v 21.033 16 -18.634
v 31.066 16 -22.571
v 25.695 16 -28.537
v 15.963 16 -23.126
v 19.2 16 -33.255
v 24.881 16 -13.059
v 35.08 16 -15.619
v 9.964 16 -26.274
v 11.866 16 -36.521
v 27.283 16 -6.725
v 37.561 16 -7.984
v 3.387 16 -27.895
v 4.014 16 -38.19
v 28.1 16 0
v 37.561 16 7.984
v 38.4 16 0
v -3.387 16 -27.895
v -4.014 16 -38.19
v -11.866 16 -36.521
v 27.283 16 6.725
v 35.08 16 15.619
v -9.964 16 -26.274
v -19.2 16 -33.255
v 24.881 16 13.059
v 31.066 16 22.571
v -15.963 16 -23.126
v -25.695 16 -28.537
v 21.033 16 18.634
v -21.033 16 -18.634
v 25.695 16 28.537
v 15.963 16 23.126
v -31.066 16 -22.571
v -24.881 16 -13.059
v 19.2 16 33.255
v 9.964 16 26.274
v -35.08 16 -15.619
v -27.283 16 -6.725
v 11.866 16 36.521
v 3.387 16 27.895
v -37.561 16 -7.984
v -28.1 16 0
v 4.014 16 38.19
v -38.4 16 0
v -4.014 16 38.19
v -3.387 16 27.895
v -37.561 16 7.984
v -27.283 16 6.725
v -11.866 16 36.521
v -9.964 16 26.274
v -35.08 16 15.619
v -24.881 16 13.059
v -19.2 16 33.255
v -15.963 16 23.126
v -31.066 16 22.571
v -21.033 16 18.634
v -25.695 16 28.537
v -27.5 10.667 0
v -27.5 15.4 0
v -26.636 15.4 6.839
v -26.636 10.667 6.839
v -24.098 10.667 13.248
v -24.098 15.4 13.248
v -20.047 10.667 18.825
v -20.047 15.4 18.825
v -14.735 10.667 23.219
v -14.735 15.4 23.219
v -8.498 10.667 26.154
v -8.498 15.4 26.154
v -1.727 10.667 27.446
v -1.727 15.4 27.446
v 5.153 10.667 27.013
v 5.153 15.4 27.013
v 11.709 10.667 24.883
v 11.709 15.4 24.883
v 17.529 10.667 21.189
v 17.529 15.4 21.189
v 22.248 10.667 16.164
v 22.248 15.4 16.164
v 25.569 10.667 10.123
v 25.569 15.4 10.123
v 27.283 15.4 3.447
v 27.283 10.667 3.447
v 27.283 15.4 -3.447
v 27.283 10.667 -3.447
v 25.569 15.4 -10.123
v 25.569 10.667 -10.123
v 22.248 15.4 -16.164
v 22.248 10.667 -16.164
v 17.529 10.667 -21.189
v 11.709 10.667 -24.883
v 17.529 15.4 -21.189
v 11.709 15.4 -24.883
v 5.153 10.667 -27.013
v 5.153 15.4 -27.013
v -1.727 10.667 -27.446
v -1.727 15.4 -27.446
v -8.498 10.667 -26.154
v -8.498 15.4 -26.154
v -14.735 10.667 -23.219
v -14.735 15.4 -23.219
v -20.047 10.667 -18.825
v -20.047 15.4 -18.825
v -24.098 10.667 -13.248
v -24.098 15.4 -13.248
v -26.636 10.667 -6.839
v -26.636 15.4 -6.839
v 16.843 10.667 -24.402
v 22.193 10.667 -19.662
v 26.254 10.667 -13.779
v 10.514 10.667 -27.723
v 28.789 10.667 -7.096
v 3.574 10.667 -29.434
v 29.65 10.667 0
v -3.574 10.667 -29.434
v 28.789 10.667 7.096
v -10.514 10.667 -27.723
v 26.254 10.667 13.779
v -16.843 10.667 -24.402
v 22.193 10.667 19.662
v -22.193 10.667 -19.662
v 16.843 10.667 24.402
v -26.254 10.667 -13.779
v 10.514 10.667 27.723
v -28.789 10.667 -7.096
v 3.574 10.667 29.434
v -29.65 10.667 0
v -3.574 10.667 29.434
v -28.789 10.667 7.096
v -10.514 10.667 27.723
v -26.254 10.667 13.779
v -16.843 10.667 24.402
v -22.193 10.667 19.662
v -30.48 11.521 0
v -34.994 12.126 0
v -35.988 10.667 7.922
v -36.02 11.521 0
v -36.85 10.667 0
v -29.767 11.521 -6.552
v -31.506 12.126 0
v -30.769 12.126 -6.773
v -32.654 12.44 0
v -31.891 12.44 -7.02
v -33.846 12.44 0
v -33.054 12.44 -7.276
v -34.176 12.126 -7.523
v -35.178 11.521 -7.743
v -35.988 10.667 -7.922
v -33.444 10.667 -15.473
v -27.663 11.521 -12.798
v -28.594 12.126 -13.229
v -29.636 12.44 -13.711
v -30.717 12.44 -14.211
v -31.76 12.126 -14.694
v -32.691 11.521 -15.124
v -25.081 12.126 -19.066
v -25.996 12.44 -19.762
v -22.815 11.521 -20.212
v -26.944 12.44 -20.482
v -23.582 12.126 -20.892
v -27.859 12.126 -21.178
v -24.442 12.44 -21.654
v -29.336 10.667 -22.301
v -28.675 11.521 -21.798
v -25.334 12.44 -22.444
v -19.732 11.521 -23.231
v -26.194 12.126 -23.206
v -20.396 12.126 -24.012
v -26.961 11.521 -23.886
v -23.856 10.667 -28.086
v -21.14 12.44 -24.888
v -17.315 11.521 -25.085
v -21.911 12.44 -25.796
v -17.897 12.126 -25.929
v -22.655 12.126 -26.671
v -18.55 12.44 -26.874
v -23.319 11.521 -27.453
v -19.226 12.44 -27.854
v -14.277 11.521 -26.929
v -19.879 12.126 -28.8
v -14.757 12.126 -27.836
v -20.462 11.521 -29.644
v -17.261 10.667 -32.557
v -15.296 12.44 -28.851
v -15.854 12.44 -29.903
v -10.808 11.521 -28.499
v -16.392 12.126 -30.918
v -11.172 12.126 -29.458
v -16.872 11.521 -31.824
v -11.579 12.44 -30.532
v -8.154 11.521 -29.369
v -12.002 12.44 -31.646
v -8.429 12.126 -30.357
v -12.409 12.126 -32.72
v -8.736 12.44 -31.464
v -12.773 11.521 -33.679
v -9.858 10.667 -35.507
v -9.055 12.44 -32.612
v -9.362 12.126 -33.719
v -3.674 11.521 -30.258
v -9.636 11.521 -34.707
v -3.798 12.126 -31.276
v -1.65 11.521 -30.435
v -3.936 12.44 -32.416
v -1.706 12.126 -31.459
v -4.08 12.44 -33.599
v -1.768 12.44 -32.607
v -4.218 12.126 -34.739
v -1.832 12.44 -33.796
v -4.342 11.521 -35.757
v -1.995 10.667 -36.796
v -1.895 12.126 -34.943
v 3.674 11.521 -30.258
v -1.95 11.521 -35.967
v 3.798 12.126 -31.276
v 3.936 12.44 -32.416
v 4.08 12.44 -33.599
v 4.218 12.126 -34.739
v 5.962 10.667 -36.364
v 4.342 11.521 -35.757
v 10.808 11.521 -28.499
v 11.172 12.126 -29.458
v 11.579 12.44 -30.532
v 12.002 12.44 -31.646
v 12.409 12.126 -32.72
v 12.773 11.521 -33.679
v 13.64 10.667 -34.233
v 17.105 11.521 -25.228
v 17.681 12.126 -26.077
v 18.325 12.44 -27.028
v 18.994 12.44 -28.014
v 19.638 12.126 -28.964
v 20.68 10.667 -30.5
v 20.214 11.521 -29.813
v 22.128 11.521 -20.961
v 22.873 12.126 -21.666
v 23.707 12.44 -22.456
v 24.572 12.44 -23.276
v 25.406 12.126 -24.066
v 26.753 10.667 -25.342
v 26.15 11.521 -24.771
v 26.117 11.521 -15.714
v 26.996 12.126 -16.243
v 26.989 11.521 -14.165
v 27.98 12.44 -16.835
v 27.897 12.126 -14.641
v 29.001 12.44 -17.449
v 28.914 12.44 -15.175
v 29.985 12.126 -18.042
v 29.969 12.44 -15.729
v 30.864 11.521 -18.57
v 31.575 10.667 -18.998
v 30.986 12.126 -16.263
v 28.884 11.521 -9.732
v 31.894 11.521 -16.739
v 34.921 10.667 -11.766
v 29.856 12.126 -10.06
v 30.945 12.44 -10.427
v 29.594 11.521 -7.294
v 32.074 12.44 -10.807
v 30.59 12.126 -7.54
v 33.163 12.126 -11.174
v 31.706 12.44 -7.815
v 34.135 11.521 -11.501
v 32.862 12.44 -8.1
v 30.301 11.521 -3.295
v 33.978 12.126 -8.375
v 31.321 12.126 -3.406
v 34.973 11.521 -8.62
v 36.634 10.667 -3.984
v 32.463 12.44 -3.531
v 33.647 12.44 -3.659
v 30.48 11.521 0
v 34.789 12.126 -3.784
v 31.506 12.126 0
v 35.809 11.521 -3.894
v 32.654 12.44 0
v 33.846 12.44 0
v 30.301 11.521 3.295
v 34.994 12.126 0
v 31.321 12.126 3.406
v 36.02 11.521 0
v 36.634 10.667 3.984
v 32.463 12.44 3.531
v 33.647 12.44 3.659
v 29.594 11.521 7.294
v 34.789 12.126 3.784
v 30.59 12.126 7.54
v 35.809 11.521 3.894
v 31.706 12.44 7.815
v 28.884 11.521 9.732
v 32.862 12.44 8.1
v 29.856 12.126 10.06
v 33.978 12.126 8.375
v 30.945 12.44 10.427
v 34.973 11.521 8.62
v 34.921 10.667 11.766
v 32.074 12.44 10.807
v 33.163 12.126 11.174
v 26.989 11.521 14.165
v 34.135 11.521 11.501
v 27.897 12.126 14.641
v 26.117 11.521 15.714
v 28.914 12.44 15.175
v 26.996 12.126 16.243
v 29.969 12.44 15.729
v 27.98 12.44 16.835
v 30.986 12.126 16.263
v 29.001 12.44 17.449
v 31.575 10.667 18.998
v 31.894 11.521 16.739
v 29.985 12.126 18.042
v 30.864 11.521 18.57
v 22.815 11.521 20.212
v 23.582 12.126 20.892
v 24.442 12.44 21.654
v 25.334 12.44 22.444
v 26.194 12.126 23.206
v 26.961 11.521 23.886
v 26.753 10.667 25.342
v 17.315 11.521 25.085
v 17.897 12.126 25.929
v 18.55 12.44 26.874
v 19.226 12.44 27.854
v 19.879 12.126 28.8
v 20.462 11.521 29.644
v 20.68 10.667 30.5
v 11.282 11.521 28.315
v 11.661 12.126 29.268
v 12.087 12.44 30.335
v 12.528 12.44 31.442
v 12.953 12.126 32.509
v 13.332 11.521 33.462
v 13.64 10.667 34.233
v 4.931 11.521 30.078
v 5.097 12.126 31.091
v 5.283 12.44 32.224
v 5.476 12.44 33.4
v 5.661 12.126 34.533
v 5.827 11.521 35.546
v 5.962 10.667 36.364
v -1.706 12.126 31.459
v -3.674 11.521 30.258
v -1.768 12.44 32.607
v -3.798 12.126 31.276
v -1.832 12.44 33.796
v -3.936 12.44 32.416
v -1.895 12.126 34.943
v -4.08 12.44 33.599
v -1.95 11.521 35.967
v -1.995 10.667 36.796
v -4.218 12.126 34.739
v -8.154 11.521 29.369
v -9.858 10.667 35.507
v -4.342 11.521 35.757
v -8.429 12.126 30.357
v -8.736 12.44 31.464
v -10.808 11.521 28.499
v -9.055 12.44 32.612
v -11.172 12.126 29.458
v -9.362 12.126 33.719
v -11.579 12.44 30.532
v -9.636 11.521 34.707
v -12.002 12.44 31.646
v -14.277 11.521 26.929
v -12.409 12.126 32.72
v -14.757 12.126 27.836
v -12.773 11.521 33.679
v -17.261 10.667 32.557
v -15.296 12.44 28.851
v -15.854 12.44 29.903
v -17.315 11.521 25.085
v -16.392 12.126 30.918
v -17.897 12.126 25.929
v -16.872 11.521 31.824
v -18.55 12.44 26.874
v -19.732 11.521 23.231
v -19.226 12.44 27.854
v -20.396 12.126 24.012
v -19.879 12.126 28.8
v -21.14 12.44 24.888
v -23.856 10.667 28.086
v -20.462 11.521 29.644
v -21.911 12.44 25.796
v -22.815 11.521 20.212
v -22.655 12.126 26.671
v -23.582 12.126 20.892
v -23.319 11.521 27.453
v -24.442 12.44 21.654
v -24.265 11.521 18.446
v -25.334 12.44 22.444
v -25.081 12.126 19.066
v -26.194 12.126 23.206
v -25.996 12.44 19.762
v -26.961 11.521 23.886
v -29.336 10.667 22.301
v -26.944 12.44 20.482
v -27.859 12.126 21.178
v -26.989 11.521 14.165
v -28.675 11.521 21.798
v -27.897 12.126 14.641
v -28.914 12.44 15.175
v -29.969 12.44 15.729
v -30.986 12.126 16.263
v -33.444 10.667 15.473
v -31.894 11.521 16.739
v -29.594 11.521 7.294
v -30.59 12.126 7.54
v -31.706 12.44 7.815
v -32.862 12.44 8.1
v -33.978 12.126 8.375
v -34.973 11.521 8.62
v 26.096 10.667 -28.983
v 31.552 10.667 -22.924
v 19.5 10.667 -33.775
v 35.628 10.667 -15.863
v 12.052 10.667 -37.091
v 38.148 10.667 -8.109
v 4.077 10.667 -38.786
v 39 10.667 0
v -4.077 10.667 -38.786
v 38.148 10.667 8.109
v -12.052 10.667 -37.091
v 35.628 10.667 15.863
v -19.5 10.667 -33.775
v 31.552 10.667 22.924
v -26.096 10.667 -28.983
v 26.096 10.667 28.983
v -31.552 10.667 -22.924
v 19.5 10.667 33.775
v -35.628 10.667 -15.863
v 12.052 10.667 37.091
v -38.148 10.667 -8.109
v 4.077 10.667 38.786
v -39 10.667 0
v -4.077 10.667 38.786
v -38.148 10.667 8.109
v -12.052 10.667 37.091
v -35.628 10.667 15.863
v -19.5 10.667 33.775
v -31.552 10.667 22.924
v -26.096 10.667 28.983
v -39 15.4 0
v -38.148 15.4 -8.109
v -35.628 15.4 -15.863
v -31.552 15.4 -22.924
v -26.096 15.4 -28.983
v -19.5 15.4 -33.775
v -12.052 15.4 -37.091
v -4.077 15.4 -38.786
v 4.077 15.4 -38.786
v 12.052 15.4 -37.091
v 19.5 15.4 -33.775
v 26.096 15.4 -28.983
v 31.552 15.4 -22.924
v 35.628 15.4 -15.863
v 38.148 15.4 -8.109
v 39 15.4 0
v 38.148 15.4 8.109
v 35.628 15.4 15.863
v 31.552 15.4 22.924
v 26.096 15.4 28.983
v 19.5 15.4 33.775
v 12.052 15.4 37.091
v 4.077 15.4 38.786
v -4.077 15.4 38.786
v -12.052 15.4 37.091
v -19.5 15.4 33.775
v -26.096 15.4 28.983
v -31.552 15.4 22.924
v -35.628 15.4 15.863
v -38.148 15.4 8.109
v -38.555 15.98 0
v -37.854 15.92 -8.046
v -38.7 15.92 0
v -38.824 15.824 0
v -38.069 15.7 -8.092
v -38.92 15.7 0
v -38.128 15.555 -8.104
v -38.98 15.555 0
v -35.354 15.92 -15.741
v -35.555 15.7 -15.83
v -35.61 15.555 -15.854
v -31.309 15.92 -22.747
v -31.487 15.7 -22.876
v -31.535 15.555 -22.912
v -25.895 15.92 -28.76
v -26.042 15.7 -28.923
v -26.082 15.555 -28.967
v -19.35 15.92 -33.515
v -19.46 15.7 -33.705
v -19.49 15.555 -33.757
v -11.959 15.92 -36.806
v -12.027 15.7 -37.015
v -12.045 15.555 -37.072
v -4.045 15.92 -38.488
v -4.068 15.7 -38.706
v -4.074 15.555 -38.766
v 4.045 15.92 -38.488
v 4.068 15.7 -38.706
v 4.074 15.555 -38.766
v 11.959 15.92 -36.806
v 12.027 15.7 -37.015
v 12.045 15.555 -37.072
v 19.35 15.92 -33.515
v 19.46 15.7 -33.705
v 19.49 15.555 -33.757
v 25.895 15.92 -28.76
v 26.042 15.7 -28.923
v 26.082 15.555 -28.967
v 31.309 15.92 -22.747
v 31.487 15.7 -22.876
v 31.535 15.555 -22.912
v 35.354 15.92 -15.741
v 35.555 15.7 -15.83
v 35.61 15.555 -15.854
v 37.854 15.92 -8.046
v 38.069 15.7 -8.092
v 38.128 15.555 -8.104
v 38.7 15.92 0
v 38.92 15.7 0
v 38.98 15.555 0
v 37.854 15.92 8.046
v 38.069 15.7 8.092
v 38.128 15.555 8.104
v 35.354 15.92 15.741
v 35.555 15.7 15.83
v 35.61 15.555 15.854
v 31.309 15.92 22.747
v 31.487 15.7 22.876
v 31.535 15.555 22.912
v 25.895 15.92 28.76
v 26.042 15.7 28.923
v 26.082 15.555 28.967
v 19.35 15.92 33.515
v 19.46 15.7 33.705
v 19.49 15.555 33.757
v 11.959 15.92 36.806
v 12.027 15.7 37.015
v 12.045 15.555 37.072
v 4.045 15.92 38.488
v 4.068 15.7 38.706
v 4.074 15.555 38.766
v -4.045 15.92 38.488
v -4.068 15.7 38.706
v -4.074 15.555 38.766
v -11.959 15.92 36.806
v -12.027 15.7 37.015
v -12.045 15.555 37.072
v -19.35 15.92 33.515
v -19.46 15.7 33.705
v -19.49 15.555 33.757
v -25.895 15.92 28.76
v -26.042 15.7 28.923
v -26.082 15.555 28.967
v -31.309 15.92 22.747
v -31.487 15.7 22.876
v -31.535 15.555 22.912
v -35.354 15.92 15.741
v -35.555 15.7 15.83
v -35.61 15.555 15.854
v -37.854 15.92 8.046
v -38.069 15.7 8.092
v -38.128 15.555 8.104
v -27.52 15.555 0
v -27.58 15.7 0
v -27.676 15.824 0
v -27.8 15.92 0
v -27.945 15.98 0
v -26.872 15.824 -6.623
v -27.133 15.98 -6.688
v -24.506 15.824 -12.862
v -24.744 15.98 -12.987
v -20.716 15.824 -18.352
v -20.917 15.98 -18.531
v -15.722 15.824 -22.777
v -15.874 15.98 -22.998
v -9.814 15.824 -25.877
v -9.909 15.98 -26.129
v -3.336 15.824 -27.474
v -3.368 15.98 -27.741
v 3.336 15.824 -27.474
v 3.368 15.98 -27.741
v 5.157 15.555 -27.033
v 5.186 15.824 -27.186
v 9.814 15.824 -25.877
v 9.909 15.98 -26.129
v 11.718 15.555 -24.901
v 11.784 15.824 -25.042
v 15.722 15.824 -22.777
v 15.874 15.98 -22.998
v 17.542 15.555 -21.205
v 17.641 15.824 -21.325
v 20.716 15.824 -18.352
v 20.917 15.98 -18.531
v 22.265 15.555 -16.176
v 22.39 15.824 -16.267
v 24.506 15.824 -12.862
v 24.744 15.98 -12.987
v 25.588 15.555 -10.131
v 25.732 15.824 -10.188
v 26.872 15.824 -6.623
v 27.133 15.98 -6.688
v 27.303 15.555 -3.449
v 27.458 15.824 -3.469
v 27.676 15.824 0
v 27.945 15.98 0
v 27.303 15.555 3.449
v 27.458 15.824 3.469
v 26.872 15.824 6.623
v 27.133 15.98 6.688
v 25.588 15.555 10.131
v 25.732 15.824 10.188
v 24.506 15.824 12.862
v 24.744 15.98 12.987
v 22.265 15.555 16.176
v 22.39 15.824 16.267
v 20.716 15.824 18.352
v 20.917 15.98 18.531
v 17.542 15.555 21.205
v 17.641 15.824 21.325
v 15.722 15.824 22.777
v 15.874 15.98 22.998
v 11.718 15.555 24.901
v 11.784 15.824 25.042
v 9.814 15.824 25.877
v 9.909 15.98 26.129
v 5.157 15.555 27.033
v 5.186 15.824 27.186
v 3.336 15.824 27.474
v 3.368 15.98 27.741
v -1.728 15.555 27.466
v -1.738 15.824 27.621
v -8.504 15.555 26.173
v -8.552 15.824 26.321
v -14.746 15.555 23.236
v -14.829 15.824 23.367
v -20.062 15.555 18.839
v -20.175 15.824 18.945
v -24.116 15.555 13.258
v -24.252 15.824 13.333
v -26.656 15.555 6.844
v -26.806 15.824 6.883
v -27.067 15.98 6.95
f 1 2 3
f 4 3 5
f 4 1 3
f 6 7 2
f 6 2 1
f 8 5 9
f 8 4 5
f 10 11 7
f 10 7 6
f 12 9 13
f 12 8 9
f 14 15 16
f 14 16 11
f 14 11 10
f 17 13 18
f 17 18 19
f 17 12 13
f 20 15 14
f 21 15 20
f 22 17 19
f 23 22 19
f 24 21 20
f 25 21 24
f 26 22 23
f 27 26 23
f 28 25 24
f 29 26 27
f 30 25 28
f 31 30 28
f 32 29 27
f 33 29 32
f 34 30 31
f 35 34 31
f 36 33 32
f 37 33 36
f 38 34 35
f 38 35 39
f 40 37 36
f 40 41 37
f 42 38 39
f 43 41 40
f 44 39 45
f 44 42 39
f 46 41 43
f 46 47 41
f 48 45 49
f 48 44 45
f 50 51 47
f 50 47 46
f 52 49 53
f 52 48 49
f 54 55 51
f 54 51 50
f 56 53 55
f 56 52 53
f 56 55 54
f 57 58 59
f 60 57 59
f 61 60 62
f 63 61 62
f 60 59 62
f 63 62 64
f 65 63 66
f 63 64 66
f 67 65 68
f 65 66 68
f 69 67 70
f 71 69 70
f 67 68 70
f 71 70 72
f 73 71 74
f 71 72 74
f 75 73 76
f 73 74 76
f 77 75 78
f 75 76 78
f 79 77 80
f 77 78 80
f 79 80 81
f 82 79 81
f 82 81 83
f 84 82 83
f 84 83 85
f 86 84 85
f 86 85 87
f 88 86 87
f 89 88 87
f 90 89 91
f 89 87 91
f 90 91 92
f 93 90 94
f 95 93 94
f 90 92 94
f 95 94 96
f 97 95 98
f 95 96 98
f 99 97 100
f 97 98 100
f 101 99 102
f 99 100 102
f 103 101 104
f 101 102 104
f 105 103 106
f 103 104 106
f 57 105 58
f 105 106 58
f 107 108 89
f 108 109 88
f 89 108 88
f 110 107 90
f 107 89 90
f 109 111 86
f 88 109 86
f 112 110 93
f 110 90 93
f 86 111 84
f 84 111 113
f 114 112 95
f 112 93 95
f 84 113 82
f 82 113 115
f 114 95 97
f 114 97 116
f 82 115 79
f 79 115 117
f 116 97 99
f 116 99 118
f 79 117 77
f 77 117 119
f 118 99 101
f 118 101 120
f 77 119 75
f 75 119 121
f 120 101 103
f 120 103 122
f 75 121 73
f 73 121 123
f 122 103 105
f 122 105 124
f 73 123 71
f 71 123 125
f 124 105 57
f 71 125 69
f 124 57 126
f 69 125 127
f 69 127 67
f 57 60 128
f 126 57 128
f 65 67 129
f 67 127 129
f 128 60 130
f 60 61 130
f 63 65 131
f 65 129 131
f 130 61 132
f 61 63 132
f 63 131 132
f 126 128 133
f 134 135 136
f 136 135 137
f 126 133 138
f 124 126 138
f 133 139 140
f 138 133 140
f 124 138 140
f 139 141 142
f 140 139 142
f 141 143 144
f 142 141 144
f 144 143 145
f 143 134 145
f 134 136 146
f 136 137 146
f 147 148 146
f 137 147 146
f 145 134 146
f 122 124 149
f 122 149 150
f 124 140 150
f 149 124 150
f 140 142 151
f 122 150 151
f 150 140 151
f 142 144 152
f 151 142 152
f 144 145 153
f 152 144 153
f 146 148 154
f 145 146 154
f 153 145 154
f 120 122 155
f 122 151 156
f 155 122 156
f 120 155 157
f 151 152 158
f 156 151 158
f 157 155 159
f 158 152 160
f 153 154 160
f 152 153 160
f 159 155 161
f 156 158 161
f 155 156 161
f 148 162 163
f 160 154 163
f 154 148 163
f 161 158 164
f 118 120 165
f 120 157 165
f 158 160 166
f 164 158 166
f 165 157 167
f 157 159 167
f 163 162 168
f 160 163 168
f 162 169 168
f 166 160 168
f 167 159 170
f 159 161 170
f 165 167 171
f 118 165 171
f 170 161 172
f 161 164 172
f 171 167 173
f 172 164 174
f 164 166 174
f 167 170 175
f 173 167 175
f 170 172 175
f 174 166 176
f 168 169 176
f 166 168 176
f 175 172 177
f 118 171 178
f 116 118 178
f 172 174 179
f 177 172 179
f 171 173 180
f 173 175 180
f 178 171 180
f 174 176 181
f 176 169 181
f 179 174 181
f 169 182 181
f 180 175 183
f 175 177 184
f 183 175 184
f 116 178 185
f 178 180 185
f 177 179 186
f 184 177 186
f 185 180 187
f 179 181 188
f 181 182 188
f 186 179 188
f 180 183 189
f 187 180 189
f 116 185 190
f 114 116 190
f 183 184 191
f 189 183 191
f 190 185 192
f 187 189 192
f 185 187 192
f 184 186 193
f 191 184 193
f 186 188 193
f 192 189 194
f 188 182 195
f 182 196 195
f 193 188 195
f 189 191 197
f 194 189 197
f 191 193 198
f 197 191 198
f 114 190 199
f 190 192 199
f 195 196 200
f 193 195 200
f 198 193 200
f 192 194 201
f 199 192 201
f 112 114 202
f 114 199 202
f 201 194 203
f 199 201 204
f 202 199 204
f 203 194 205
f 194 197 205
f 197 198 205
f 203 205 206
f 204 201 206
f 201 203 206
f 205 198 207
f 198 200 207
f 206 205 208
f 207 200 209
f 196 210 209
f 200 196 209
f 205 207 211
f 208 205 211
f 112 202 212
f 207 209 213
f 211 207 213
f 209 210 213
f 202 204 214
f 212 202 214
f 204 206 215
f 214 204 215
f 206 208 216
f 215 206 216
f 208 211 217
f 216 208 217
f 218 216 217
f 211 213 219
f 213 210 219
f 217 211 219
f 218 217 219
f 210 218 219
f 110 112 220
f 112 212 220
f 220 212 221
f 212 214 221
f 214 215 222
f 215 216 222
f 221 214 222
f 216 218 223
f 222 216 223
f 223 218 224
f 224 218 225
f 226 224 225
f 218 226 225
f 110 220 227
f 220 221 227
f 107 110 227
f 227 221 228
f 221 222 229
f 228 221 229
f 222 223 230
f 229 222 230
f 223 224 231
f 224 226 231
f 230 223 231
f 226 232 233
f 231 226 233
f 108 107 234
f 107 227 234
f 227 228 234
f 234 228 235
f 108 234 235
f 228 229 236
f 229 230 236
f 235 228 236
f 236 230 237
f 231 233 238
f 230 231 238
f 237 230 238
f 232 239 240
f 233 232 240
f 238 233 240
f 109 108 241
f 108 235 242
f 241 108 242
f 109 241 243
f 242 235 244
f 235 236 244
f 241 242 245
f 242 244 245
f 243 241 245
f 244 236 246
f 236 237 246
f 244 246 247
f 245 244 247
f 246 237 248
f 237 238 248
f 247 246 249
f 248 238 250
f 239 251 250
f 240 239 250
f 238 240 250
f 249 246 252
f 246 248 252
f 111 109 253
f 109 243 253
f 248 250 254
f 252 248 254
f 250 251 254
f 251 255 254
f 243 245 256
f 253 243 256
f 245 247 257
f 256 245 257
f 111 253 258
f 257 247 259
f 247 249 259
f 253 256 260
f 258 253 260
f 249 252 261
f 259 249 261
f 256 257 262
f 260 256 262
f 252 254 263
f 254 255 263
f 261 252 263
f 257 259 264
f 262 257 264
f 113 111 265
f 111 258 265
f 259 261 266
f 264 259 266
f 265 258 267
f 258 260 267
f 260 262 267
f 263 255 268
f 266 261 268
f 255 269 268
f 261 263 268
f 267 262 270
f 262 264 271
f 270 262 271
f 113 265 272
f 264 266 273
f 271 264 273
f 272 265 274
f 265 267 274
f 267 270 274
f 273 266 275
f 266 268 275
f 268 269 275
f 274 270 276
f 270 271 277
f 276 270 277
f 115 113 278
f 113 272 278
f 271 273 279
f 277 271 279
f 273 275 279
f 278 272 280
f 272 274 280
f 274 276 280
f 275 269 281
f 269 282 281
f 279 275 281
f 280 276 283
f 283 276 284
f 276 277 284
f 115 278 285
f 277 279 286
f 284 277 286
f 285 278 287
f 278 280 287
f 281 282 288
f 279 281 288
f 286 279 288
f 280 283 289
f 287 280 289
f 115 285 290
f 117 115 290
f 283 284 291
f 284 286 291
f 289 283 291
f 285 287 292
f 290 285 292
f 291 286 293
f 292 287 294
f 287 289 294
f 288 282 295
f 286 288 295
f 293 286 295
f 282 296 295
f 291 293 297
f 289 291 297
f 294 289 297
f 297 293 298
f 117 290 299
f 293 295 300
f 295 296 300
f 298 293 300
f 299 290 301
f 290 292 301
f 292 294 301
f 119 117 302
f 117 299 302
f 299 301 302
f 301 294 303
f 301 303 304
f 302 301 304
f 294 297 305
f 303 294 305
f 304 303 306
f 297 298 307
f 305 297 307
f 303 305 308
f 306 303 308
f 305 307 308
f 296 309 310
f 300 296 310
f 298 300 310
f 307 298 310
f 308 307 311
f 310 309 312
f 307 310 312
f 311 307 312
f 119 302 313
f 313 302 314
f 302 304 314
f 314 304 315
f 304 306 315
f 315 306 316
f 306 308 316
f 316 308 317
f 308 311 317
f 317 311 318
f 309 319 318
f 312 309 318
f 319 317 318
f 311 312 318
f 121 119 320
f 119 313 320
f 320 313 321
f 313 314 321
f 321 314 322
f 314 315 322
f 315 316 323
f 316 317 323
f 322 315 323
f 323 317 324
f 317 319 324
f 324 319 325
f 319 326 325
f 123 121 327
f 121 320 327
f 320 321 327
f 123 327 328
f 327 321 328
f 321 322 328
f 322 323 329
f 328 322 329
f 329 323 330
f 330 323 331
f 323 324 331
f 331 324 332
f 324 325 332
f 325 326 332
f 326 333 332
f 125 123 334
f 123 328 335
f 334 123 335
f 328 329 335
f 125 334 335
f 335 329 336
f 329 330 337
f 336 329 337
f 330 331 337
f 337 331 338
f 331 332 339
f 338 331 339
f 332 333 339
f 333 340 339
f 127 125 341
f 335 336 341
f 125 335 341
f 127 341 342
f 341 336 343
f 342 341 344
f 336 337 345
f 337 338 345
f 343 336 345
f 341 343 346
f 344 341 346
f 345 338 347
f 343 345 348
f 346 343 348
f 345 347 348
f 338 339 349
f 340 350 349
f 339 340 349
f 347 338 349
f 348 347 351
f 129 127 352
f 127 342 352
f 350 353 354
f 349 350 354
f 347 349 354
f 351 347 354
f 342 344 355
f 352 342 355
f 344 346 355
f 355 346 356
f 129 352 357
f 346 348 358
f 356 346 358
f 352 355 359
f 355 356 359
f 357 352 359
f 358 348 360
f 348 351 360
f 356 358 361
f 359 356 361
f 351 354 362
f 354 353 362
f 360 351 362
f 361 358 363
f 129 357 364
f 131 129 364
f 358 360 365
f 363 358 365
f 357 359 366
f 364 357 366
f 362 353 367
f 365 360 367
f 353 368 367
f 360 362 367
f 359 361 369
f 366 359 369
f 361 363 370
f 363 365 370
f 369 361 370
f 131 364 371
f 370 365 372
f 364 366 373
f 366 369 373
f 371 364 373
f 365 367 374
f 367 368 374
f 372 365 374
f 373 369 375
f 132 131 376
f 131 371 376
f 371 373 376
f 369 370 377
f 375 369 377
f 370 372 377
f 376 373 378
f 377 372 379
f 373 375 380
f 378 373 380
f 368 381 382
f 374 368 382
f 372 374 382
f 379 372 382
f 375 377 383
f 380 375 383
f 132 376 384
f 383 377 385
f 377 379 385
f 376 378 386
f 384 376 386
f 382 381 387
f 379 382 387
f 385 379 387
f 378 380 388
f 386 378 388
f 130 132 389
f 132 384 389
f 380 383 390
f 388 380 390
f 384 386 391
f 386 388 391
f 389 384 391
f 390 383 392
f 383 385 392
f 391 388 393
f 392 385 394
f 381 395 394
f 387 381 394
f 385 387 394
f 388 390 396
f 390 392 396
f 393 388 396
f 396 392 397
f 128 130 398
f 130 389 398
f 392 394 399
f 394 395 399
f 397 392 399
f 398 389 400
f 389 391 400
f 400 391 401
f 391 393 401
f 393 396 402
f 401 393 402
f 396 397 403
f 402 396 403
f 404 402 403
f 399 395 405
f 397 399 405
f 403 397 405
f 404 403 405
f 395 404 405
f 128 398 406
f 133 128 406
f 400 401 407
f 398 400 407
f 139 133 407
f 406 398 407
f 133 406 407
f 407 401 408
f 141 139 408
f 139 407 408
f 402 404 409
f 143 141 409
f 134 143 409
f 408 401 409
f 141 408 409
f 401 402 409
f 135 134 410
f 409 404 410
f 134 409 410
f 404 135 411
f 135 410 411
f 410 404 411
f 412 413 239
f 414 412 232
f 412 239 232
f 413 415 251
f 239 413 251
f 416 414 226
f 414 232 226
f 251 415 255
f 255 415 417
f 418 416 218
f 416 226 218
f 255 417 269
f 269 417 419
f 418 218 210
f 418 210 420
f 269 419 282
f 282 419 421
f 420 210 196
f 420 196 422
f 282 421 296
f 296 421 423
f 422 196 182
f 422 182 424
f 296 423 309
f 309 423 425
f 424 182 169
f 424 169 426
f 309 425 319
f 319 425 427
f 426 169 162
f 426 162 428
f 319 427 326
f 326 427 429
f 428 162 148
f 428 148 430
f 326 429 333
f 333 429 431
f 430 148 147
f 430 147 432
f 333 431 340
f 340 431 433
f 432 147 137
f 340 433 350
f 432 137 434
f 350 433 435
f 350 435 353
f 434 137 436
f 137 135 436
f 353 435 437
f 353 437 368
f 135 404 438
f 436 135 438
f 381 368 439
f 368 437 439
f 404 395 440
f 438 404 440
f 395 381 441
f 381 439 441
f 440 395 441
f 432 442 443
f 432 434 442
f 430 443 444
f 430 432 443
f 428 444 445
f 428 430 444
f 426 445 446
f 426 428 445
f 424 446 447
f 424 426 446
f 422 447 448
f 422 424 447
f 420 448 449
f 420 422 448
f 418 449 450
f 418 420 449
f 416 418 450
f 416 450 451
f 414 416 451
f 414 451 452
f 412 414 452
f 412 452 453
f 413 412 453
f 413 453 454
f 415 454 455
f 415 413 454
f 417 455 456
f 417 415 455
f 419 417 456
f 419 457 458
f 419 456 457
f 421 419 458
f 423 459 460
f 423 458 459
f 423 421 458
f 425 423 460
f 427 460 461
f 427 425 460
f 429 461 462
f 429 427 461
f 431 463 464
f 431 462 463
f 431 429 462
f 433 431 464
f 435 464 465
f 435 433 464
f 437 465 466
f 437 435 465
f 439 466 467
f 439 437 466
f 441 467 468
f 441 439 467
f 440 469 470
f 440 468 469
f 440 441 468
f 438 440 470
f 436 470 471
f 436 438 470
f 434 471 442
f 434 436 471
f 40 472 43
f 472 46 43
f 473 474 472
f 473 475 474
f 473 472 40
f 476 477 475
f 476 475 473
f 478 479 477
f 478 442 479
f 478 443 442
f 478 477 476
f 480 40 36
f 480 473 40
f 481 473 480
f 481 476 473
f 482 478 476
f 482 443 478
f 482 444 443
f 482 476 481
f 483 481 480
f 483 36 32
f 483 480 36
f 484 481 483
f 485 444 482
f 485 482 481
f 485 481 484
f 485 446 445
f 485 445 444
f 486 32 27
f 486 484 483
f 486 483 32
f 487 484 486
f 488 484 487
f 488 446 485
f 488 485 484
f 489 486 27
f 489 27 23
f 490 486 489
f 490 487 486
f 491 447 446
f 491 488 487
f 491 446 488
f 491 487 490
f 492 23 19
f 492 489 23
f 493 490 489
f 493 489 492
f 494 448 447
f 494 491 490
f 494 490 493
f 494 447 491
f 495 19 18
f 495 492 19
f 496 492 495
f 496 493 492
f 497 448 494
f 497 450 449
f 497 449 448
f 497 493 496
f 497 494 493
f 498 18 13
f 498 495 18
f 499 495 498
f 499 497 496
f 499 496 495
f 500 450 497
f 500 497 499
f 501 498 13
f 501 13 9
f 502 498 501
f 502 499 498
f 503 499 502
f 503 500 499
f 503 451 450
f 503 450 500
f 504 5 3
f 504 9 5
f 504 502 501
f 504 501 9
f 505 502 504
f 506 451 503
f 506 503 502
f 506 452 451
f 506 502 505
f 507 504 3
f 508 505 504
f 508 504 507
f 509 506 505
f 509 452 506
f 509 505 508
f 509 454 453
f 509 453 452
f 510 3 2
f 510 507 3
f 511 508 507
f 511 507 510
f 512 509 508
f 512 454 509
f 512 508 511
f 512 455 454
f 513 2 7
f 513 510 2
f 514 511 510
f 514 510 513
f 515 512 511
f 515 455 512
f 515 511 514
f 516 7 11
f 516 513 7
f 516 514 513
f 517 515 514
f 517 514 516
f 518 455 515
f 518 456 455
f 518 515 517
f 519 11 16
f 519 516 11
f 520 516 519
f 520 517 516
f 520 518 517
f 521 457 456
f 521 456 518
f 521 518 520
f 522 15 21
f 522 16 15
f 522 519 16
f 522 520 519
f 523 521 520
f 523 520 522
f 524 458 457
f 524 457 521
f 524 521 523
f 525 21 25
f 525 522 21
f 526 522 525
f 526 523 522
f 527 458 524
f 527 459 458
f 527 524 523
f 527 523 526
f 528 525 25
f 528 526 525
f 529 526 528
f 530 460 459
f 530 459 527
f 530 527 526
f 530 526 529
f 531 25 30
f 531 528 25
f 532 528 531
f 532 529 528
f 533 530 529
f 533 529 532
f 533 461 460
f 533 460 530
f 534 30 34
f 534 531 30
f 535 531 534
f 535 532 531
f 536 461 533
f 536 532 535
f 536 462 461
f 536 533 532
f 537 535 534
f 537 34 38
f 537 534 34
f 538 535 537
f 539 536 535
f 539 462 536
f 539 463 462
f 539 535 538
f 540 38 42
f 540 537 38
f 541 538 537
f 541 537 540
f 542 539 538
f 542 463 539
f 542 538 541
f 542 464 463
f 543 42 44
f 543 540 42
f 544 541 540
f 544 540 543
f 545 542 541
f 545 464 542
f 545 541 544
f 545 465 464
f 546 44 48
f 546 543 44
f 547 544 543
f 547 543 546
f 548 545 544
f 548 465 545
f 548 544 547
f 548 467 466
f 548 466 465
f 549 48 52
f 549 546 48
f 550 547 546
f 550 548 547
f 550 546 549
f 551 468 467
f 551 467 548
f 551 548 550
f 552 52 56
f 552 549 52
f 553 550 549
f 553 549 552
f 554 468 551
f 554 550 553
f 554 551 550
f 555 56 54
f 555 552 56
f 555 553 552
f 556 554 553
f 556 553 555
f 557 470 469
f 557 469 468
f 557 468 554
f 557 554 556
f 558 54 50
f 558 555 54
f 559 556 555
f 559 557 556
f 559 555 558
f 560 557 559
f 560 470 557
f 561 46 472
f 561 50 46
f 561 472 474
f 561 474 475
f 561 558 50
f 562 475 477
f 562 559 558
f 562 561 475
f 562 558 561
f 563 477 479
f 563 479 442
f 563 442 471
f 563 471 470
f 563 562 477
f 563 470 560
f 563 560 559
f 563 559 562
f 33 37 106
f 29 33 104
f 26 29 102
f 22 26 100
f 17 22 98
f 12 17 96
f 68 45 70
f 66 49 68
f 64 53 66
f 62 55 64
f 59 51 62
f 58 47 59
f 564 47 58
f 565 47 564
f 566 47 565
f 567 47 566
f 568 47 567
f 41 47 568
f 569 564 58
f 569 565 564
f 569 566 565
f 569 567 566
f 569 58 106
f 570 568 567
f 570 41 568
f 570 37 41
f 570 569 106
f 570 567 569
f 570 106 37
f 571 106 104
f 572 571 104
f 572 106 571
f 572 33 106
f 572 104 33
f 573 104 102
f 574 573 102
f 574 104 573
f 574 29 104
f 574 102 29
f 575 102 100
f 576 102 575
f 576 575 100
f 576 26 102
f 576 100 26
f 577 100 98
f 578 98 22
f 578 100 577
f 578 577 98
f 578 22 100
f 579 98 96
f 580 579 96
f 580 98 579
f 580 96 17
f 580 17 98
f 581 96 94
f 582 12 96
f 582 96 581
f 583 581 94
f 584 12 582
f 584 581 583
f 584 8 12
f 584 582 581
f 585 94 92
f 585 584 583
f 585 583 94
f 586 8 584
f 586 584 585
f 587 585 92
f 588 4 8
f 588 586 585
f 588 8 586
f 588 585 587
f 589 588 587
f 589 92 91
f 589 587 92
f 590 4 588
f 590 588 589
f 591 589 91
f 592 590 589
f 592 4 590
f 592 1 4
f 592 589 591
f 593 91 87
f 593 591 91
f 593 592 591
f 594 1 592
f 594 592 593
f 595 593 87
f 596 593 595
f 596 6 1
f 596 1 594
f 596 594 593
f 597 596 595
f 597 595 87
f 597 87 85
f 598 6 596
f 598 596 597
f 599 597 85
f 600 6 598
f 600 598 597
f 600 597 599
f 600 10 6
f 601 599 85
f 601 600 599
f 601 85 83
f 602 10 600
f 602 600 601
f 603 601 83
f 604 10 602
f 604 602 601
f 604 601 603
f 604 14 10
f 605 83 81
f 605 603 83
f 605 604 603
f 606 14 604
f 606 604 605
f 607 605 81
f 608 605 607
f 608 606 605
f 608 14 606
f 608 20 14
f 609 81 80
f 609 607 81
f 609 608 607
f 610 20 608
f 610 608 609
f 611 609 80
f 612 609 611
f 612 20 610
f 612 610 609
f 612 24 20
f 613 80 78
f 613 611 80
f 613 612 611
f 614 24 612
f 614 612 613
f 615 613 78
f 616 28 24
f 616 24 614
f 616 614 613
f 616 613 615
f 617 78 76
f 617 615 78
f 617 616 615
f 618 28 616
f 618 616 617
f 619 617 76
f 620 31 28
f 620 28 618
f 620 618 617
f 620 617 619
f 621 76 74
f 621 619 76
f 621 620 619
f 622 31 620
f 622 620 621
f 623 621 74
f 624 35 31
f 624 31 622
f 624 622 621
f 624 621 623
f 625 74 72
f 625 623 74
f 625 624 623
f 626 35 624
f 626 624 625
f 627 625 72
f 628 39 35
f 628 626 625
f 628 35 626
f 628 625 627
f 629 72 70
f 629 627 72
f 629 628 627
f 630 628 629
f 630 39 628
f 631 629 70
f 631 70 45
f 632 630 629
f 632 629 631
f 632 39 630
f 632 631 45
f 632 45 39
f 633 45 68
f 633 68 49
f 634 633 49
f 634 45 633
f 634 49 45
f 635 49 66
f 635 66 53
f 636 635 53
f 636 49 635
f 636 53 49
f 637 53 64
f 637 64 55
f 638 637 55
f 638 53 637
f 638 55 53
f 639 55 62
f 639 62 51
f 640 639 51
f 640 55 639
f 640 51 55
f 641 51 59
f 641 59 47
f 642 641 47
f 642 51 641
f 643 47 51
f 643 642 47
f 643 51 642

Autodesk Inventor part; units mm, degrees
sketch "Sketch_1" plane through (0, 0, 0) normal (0, 0, 1) x (1, 0, 0)
  line L0 (0, 16) -> (0, 10.6667)
  line L1 (-39, 10.6667) -> (-36.8499, 10.6667)
  arc A0 (-29.6501, 10.6667) -> (-36.8499, 10.6667) centre (-33.25, 8) ccw
  line L2 (-29.6501, 10.6667) -> (-27.5, 10.6667)
  line L3 (-27.5, 10.6667) -> (-27.5, 15.4)
  arc A1 (-27.5, 15.4) -> (-28.1, 16) centre (-28.1, 15.4) ccw
  line L4 (-28.1, 16) -> (-38.4, 16)
  arc A2 (-38.4, 16) -> (-39, 15.4) centre (-38.4, 15.4) ccw
  line L5 (-39, 15.4) -> (-39, 10.6667)
revolve "Revolution1" add sketch "Sketch_1" angle 360 about axis through (0, 16, 0) along (0, 1, 0)
ref_plane "tb_sdt_srd_XY" through (0, 0, 0) normal (0, 1, 0) x (1, 0, 0)
ref_plane "tb_sdt_srd_YZ" through (0, 0, 0) normal (1, 0, 0) x (0, 0, -1)
ref_plane "tb_sdt_srd_ZX" through (0, 0, 0) normal (0, 0, -1) x (0, 1, 0)
ref_plane "tb_sdt_srd1_1_XY" through (0, 8, -33.25) normal (0, 1, 0) x (1, 0, 0)
ref_plane "tb_sdt_srd1_1_YZ" through (0, 8, -33.25) normal (1, 0, 0) x (0, 0, -1)
ref_plane "tb_sdt_srd1_1_ZX" through (0, 8, -33.25) normal (0, 0, -1) x (0, 1, 0)
ref_plane "tb_sdt_srd1_10_XY" through (25.9959, 8, 20.731) normal (0, 1, 0) x (1, 0, 0)
ref_plane "tb_sdt_srd1_10_YZ" through (25.9959, 8, 20.731) normal (1, 0, 0) x (0, 0, -1)
ref_plane "tb_sdt_srd1_10_ZX" through (25.9959, 8, 20.731) normal (0, 0, -1) x (0, 1, 0)
ref_plane "tb_sdt_srd1_11_XY" through (32.4164, 8, 7.3988) normal (0, 1, 0) x (1, 0, 0)
ref_plane "tb_sdt_srd1_11_YZ" through (32.4164, 8, 7.3988) normal (1, 0, 0) x (0, 0, -1)
ref_plane "tb_sdt_srd1_11_ZX" through (32.4164, 8, 7.3988) normal (0, 0, -1) x (0, 1, 0)
ref_plane "tb_sdt_srd1_12_XY" through (32.4164, 8, -7.3988) normal (0, 1, 0) x (1, 0, 0)
ref_plane "tb_sdt_srd1_12_YZ" through (32.4164, 8, -7.3988) normal (1, 0, 0) x (0, 0, -1)
ref_plane "tb_sdt_srd1_12_ZX" through (32.4164, 8, -7.3988) normal (0, 0, -1) x (0, 1, 0)
ref_plane "tb_sdt_srd1_13_XY" through (25.9959, 8, -20.731) normal (0, 1, 0) x (1, 0, 0)
ref_plane "tb_sdt_srd1_13_YZ" through (25.9959, 8, -20.731) normal (1, 0, 0) x (0, 0, -1)
ref_plane "tb_sdt_srd1_13_ZX" through (25.9959, 8, -20.731) normal (0, 0, -1) x (0, 1, 0)
ref_plane "tb_sdt_srd1_14_XY" through (14.4266, 8, -29.9572) normal (0, 1, 0) x (1, 0, 0)
ref_plane "tb_sdt_srd1_14_YZ" through (14.4266, 8, -29.9572) normal (1, 0, 0) x (0, 0, -1)
ref_plane "tb_sdt_srd1_14_ZX" through (14.4266, 8, -29.9572) normal (0, 0, -1) x (0, 1, 0)
ref_plane "tb_sdt_srd1_2_XY" through (-14.4266, 8, -29.9572) normal (0, 1, 0) x (1, 0, 0)
ref_plane "tb_sdt_srd1_2_YZ" through (-14.4266, 8, -29.9572) normal (1, 0, 0) x (0, 0, -1)
ref_plane "tb_sdt_srd1_2_ZX" through (-14.4266, 8, -29.9572) normal (0, 0, -1) x (0, 1, 0)
ref_plane "tb_sdt_srd1_3_XY" through (-25.9959, 8, -20.731) normal (0, 1, 0) x (1, 0, 0)
ref_plane "tb_sdt_srd1_3_YZ" through (-25.9959, 8, -20.731) normal (1, 0, 0) x (0, 0, -1)
ref_plane "tb_sdt_srd1_3_ZX" through (-25.9959, 8, -20.731) normal (0, 0, -1) x (0, 1, 0)
ref_plane "tb_sdt_srd1_4_XY" through (-32.4164, 8, -7.3988) normal (0, 1, 0) x (1, 0, 0)
ref_plane "tb_sdt_srd1_4_YZ" through (-32.4164, 8, -7.3988) normal (1, 0, 0) x (0, 0, -1)
ref_plane "tb_sdt_srd1_4_ZX" through (-32.4164, 8, -7.3988) normal (0, 0, -1) x (0, 1, 0)
ref_plane "tb_sdt_srd1_5_XY" through (-32.4164, 8, 7.3988) normal (0, 1, 0) x (1, 0, 0)
ref_plane "tb_sdt_srd1_5_YZ" through (-32.4164, 8, 7.3988) normal (1, 0, 0) x (0, 0, -1)
ref_plane "tb_sdt_srd1_5_ZX" through (-32.4164, 8, 7.3988) normal (0, 0, -1) x (0, 1, 0)
ref_plane "tb_sdt_srd1_6_XY" through (-25.9959, 8, 20.731) normal (0, 1, 0) x (1, 0, 0)
ref_plane "tb_sdt_srd1_6_YZ" through (-25.9959, 8, 20.731) normal (1, 0, 0) x (0, 0, -1)
ref_plane "tb_sdt_srd1_6_ZX" through (-25.9959, 8, 20.731) normal (0, 0, -1) x (0, 1, 0)
ref_plane "tb_sdt_srd1_7_XY" through (-14.4266, 8, 29.9572) normal (0, 1, 0) x (1, 0, 0)
ref_plane "tb_sdt_srd1_7_YZ" through (-14.4266, 8, 29.9572) normal (1, 0, 0) x (0, 0, -1)
ref_plane "tb_sdt_srd1_7_ZX" through (-14.4266, 8, 29.9572) normal (0, 0, -1) x (0, 1, 0)
ref_plane "tb_sdt_srd1_8_XY" through (0, 8, 33.25) normal (0, 1, 0) x (1, 0, 0)
ref_plane "tb_sdt_srd1_8_YZ" through (0, 8, 33.25) normal (1, 0, 0) x (0, 0, -1)
ref_plane "tb_sdt_srd1_8_ZX" through (0, 8, 33.25) normal (0, 0, -1) x (0, 1, 0)
ref_plane "tb_sdt_srd1_9_XY" through (14.4266, 8, 29.9572) normal (0, 1, 0) x (1, 0, 0)
ref_plane "tb_sdt_srd1_9_YZ" through (14.4266, 8, 29.9572) normal (1, 0, 0) x (0, 0, -1)
ref_plane "tb_sdt_srd1_9_ZX" through (14.4266, 8, 29.9572) normal (0, 0, -1) x (0, 1, 0)
properties part number "51111 Shaft raceway disc"
